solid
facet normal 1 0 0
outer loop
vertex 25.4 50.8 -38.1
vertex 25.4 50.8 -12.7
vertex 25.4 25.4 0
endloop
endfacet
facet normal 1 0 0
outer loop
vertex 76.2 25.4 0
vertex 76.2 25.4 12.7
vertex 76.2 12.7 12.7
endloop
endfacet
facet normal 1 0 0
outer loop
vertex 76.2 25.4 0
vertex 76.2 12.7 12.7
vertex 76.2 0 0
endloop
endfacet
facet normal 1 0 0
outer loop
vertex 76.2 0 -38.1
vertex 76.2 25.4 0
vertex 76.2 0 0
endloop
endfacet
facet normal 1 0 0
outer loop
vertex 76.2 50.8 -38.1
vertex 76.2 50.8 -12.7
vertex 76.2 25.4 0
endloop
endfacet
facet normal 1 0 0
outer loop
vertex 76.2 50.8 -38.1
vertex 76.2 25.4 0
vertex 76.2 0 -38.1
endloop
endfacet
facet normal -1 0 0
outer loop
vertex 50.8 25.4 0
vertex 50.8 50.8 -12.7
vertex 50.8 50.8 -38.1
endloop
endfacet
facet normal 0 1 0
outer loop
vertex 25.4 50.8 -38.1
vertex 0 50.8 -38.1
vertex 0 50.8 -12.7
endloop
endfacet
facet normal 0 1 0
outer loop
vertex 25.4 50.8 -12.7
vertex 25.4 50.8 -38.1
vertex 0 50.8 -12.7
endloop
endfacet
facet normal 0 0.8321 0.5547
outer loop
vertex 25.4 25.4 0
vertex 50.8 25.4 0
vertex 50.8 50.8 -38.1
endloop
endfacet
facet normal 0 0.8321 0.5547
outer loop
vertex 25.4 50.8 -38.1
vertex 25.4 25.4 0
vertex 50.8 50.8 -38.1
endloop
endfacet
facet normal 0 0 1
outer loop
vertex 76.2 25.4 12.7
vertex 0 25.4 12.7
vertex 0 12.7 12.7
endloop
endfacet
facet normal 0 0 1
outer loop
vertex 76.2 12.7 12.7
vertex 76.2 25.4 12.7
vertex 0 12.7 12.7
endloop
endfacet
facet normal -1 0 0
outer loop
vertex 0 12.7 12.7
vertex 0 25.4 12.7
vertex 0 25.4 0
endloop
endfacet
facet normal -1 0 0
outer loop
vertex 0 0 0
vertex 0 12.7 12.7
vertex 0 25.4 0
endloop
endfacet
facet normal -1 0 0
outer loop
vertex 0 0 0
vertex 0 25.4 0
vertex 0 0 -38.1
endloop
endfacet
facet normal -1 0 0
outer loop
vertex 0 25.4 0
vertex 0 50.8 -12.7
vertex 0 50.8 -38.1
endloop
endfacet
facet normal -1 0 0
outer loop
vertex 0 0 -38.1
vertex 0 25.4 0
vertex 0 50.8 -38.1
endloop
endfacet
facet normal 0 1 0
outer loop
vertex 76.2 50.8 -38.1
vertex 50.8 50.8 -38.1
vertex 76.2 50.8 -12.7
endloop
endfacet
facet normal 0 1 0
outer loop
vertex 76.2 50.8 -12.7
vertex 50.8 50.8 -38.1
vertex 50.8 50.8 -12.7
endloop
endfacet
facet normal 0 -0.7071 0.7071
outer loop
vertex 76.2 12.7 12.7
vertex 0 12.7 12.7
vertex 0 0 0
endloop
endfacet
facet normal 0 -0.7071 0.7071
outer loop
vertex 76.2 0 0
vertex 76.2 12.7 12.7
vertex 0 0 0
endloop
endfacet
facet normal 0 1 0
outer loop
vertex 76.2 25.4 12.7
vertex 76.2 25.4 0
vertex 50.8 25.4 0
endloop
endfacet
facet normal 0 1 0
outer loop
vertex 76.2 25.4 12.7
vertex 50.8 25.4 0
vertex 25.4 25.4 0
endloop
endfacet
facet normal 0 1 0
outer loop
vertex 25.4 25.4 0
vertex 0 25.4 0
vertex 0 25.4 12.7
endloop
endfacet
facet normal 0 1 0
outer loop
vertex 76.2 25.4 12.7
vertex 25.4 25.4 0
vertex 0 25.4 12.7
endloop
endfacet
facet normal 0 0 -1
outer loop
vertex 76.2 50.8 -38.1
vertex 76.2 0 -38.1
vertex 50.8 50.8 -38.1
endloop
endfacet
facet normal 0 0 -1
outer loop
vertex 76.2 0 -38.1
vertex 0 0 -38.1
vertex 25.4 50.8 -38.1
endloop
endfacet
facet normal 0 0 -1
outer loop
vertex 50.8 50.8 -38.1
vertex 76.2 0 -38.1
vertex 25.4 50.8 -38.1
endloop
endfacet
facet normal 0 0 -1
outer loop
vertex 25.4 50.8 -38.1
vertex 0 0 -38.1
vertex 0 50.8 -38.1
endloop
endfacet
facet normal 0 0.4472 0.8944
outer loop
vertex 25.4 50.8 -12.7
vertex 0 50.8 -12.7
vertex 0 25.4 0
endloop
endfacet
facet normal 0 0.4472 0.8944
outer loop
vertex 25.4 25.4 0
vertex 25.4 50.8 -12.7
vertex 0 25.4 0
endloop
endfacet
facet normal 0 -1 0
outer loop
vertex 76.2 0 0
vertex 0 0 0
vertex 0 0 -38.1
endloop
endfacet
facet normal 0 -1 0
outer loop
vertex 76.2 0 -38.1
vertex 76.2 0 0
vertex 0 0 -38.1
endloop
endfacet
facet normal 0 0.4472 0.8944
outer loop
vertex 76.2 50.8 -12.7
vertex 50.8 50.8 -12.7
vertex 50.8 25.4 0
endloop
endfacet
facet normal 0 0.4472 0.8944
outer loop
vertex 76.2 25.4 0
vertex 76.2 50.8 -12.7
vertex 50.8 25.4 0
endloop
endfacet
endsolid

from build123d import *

# Parameters (mm, degrees)
SALIENTE_EXTRUIR2_DEPTH = 76.2
CORTAR_EXTRUIR3_START   = -25.4
CORTAR_EXTRUIR3_DEPTH   = 25.4


with BuildPart() as part:
    # Croquis2 → Saliente-Extruir2 (new body)
    with BuildSketch(Plane(origin=(0, 0, 0), x_dir=(0, 0, -1), z_dir=(1, 0, 0))):
        Polygon((0, 0), (38.1, 0), (38.1, 50.8), (12.7, 50.8), (0, 25.4), (-12.7, 25.4), (-12.7, 12.7), align=None)
    extrude(amount=SALIENTE_EXTRUIR2_DEPTH)

    # Croquis4 → Cortar-Extruir3 (cut)
    with BuildSketch(Plane(origin=(76.2, 0, 0), x_dir=(0, 0, -1), z_dir=(1, 0, 0)).offset(CORTAR_EXTRUIR3_START)):
        Polygon((0, 25.4), (38.1, 50.8), (12.7, 50.8), align=None)
    extrude(amount=-CORTAR_EXTRUIR3_DEPTH, mode=Mode.SUBTRACT)


solid = part.part
